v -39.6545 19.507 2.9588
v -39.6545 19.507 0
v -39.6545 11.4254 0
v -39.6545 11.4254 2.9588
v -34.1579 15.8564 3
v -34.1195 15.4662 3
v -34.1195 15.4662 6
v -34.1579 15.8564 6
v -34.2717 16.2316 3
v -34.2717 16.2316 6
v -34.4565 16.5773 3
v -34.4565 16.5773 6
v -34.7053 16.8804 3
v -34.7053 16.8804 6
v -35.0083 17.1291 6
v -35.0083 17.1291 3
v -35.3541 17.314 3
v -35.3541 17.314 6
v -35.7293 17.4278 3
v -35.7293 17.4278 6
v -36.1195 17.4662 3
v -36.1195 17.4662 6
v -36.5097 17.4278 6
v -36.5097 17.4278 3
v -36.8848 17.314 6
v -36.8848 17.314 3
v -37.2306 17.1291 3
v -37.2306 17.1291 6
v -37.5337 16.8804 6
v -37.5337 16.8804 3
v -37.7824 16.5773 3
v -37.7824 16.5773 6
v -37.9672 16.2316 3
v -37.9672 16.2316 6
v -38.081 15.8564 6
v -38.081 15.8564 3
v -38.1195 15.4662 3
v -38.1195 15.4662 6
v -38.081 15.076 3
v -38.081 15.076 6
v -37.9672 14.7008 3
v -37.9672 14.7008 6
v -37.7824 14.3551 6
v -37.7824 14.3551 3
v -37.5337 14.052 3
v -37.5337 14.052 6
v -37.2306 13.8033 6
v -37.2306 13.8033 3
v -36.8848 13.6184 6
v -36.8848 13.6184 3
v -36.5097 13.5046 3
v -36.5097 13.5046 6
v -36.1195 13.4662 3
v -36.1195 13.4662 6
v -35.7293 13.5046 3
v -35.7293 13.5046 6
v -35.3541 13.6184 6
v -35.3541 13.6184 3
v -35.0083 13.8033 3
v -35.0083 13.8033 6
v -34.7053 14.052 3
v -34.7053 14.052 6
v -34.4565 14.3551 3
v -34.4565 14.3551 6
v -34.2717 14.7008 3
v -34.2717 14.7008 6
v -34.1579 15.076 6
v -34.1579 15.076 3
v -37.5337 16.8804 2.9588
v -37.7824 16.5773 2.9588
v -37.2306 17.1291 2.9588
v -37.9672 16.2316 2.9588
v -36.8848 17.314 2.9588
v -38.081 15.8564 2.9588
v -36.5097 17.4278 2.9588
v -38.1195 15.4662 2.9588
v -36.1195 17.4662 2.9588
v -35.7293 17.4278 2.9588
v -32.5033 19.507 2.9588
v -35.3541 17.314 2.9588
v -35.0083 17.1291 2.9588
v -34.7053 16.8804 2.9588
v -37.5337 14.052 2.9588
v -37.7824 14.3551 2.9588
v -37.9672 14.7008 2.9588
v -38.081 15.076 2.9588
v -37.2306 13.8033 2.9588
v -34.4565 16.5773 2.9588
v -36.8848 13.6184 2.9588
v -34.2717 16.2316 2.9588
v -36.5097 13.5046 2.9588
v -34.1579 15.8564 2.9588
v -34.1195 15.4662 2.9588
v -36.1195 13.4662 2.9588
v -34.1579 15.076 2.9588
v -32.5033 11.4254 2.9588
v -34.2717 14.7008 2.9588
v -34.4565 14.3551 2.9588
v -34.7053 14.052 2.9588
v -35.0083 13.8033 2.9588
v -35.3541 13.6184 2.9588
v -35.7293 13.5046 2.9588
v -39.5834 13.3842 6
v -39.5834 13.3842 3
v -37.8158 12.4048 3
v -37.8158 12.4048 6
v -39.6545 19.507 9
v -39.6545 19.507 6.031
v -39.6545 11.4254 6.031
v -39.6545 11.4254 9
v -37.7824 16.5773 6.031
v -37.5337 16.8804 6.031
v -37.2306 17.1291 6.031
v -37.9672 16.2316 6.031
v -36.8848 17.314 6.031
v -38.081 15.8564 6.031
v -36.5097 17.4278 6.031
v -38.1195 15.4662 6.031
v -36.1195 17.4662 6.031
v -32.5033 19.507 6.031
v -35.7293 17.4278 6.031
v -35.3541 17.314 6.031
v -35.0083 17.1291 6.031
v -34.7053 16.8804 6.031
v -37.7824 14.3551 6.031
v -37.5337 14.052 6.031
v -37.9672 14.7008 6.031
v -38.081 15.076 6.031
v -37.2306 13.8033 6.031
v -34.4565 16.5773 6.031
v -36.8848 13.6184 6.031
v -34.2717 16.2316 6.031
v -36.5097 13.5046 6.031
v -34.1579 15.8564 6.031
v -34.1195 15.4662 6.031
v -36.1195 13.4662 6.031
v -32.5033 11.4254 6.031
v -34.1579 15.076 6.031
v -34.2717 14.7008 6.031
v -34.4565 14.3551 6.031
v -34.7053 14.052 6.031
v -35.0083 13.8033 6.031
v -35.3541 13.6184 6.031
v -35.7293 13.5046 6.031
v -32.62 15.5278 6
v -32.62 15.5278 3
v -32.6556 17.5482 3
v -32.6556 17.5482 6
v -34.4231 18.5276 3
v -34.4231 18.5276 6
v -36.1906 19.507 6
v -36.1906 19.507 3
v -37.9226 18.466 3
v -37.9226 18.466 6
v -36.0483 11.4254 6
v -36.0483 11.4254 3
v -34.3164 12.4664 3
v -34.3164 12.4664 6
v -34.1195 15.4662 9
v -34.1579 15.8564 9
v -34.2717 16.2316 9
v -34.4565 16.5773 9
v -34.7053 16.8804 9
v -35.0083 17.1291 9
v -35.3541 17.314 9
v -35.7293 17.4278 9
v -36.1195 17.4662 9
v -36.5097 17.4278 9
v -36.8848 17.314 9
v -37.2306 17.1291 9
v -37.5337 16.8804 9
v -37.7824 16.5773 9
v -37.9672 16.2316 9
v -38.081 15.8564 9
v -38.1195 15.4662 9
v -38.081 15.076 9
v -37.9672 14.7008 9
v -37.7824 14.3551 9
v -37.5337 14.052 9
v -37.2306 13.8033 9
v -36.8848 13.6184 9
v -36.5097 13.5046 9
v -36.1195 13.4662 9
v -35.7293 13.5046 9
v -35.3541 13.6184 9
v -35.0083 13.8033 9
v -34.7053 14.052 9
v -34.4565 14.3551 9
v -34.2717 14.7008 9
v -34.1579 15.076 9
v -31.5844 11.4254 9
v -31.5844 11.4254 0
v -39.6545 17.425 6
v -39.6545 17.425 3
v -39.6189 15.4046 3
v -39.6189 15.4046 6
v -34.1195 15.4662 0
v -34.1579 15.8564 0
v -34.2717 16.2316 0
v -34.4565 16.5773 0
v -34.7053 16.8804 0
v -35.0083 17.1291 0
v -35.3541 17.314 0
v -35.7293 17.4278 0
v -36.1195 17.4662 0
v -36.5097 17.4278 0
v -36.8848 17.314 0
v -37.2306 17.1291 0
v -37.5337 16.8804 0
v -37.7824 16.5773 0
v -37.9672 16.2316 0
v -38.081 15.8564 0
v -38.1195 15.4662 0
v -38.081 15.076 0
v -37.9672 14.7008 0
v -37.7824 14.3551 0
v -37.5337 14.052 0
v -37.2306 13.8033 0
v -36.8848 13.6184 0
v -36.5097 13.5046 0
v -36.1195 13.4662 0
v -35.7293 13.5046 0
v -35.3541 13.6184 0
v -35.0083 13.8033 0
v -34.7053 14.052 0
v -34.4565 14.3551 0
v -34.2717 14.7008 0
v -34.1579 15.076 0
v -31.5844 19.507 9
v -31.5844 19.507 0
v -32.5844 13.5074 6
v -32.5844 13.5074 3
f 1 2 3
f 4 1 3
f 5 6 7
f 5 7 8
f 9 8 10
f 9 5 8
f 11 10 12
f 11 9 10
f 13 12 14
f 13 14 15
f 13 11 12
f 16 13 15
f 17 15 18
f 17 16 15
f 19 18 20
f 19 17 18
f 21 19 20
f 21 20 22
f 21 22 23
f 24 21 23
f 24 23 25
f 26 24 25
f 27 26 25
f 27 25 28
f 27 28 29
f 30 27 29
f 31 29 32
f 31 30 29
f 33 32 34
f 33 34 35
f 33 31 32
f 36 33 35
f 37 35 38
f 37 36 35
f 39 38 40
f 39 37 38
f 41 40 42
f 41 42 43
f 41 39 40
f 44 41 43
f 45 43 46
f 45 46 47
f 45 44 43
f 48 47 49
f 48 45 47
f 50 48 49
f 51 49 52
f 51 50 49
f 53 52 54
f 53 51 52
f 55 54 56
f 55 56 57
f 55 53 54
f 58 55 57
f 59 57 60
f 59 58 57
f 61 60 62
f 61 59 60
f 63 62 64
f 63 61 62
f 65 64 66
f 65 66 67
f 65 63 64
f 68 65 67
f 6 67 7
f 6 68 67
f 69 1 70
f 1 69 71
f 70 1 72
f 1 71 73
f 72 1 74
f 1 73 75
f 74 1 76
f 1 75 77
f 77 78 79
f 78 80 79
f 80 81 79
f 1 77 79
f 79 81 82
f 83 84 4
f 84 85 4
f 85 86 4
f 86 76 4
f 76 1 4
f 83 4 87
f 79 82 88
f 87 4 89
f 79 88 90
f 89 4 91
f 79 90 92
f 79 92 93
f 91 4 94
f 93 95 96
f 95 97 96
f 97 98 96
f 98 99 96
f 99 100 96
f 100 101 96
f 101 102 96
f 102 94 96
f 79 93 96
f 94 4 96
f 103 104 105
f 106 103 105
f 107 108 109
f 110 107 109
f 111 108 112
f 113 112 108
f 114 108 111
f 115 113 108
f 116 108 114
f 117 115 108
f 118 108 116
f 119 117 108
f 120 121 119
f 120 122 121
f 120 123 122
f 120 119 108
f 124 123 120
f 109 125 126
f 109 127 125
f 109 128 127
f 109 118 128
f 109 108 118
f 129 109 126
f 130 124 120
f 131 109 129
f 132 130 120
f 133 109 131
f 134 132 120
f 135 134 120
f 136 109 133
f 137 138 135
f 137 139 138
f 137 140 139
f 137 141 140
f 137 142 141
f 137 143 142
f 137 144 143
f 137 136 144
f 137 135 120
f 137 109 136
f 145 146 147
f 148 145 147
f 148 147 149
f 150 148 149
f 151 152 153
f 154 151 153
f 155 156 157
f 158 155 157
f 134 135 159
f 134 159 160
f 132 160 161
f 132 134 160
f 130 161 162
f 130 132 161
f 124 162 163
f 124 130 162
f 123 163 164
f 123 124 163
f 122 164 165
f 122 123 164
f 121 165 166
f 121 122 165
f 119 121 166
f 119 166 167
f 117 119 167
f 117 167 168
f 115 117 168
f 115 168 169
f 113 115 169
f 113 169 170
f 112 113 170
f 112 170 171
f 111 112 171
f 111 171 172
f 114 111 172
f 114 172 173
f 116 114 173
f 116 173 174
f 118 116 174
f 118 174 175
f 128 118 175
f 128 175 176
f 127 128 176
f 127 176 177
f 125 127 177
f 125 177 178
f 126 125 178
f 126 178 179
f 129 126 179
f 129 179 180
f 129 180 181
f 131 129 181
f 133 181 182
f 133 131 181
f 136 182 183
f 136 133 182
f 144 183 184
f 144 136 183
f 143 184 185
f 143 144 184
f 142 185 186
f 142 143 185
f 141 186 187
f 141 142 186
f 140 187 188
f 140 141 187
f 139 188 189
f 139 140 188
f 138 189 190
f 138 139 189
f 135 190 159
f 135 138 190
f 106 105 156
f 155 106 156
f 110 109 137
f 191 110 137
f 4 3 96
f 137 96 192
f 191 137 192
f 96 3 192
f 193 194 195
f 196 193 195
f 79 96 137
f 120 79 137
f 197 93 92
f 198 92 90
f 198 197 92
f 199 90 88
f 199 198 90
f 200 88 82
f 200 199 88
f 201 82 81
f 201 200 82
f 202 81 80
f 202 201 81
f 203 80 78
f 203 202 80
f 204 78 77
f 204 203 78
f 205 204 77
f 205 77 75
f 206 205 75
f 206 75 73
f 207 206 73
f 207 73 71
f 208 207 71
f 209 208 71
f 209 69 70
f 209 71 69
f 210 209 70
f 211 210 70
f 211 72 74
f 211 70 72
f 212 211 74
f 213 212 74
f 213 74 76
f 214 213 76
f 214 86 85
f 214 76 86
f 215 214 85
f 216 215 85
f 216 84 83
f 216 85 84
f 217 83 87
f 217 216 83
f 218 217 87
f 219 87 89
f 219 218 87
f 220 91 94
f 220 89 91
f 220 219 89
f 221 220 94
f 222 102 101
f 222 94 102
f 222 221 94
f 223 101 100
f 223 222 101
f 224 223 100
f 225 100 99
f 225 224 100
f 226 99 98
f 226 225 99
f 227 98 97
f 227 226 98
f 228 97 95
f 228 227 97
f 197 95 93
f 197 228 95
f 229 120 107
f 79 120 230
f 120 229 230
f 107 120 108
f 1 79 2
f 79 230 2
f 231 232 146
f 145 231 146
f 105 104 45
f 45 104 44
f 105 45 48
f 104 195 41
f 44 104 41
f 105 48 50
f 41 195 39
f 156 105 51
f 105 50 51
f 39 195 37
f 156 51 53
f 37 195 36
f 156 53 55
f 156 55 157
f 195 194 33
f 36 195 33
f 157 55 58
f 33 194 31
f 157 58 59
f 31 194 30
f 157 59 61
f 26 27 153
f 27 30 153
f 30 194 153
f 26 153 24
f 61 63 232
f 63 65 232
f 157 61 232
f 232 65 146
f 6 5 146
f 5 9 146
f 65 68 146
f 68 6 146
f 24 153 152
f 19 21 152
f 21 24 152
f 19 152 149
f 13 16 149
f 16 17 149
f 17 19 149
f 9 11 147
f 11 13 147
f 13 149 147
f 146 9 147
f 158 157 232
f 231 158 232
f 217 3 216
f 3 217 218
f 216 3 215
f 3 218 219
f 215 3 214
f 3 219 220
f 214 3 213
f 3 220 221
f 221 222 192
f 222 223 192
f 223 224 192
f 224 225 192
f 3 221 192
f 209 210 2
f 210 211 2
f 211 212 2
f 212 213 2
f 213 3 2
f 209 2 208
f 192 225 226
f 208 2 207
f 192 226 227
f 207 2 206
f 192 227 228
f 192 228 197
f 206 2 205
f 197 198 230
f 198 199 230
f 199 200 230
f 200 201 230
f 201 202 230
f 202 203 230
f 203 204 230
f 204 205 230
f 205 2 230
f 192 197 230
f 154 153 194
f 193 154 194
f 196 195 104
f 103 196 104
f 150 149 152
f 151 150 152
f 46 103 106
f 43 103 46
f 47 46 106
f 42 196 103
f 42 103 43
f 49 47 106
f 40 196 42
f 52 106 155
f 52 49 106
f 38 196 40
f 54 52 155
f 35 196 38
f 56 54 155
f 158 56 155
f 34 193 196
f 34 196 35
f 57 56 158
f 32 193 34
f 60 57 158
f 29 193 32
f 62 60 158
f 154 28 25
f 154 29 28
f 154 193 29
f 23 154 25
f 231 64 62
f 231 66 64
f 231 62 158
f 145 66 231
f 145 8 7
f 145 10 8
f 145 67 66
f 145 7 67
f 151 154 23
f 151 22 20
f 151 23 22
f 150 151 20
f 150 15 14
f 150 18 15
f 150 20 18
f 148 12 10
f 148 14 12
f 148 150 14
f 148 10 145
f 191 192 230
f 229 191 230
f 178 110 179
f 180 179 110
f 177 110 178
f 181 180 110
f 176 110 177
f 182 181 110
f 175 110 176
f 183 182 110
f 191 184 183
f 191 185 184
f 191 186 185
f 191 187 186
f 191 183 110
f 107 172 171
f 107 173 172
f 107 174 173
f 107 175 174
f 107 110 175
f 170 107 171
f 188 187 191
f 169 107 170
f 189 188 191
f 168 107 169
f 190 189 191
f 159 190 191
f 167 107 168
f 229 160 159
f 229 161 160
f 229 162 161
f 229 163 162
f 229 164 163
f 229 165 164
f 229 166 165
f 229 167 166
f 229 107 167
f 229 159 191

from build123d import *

# Parameters (mm, degrees)
F1_START = 3
F0_R     = 2
F1_DEPTH = 3
F2_DEPTH = 9
F3_W     = 7.1511580269
F3_H     = 3.0721682124
F4_DEPTH = 25


with BuildPart() as f1:
    # F0 (on Top) → F1 (new body)
    with BuildSketch(Plane.XY.offset(F1_START)):
        with BuildLine():
            ThreePointArc((-39.6189296859, 15.4045963577), (-39.1808945494, 17.1625789331), (-37.9225537154, 18.4660189438))
            Line((-37.9225537154, 18.4660189438), (-39.6544984202, 17.4250089553))
            Line((-39.6544984202, 17.4250089553), (-39.6189296859, 15.4045963577))
        make_face()
        with BuildLine():
            Line((-39.5833609418, 13.3841831991), (-37.8158476605, 12.4047801734))
            ThreePointArc((-37.8158476605, 12.4047801734), (-39.1192878718, 13.6631210573), (-39.6189296859, 15.4045963577))
            Line((-39.6189296859, 15.4045963577), (-39.5833609418, 13.3841831991))
        make_face()
        with BuildLine():
            Line((-36.0483344454, 11.4253771844), (-34.3163899469, 12.4663870488))
            ThreePointArc((-34.3163899469, 12.4663870488), (-36.0578650476, 11.9667451837), (-37.8158476605, 12.4047801734))
            Line((-37.8158476605, 12.4047801734), (-36.0483344454, 11.4253771844))
        make_face()
        with BuildLine():
            ThreePointArc((-32.6200141688, 15.5278099302), (-32.6196074877, 15.4970076286), (-32.6194719238, 15.4662029406))
            ThreePointArc((-32.6194719238, 15.4662029406), (-33.0730981024, 13.7429483046), (-34.3163899469, 12.4663870488))
            Line((-34.3163899469, 12.4663870488), (-32.5844454274, 13.5073969259))
            Line((-32.5844454274, 13.5073969259), (-32.6200141688, 15.5278099302))
        make_face()
        with BuildLine():
            ThreePointArc((-34.4230959253, 18.5276255628), (-33.1196560035, 17.26928487), (-32.6200141688, 15.5278099302))
            Line((-32.6200141688, 15.5278099302), (-32.6555829058, 17.5482226822))
            Line((-32.6555829058, 17.5482226822), (-34.4230959253, 18.5276255628))
        make_face()
        with BuildLine():
            ThreePointArc((-37.9225537154, 18.4660189438), (-36.1810785423, 18.9656607021), (-34.4230959253, 18.5276255628))
            Line((-34.4230959253, 18.5276255628), (-36.1906094022, 19.5070286969))
            Line((-36.1906094022, 19.5070286969), (-37.9225537154, 18.4660189438))
        make_face()
        with BuildLine():
            ThreePointArc((-34.3163899469, 12.4663870488), (-33.0730981024, 13.7429483046), (-32.6194719238, 15.4662029406))
            ThreePointArc((-32.6194719238, 15.4662029406), (-32.6196074877, 15.4970076286), (-32.6200141688, 15.5278099302))
            ThreePointArc((-32.6200141688, 15.5278099302), (-33.1196560035, 17.26928487), (-34.4230959253, 18.5276255628))
            ThreePointArc((-34.4230959253, 18.5276255628), (-36.1810785423, 18.9656607021), (-37.9225537154, 18.4660189438))
            ThreePointArc((-37.9225537154, 18.4660189438), (-39.1808945494, 17.1625789331), (-39.6189296859, 15.4045963577))
            ThreePointArc((-39.6189296859, 15.4045963577), (-39.1192878718, 13.6631210573), (-37.8158476605, 12.4047801734))
            ThreePointArc((-37.8158476605, 12.4047801734), (-36.0578650476, 11.9667451837), (-34.3163899469, 12.4663870488))
        make_face()
        with Locations((-36.1194719238, 15.4662029406)):
            Circle(F0_R, mode=Mode.SUBTRACT)
    extrude(amount=F1_DEPTH)


with BuildPart() as f2:
    # F0 (on Top) → F2 (new body)
    with BuildSketch(Plane.XY):
        with BuildLine():
            ThreePointArc((-39.6189296859, 15.4045963577), (-39.1808945494, 17.1625789331), (-37.9225537154, 18.4660189438))
            Line((-37.9225537154, 18.4660189438), (-39.6544984202, 17.4250089553))
            Line((-39.6544984202, 17.4250089553), (-39.6189296859, 15.4045963577))
        make_face()
        Polygon((-36.0483344454, 11.4253771844), (-37.8158476605, 12.4047801734), (-39.5833609418, 13.3841831991), (-39.6189296859, 15.4045963577), (-39.6544984202, 17.4250089553), (-39.6544984202, 11.4253771844), align=None)
        Polygon((-32.5844454274, 13.5073969259), (-34.3163899469, 12.4663870488), (-36.0483344454, 11.4253771844), (-32.5844454274, 11.4253771844), align=None)
        with BuildLine():
            ThreePointArc((-34.3163899469, 12.4663870488), (-33.0730981024, 13.7429483046), (-32.6194719238, 15.4662029406))
            ThreePointArc((-32.6194719238, 15.4662029406), (-32.6196074877, 15.4970076286), (-32.6200141688, 15.5278099302))
            ThreePointArc((-32.6200141688, 15.5278099302), (-33.1196560035, 17.26928487), (-34.4230959253, 18.5276255628))
            ThreePointArc((-34.4230959253, 18.5276255628), (-36.1810785423, 18.9656607021), (-37.9225537154, 18.4660189438))
            ThreePointArc((-37.9225537154, 18.4660189438), (-39.1808945494, 17.1625789331), (-39.6189296859, 15.4045963577))
            ThreePointArc((-39.6189296859, 15.4045963577), (-39.1192878718, 13.6631210573), (-37.8158476605, 12.4047801734))
            ThreePointArc((-37.8158476605, 12.4047801734), (-36.0578650476, 11.9667451837), (-34.3163899469, 12.4663870488))
        make_face()
        with Locations((-36.1194719238, 15.4662029406)):
            Circle(F0_R, mode=Mode.SUBTRACT)
        with BuildLine():
            ThreePointArc((-32.6200141688, 15.5278099302), (-32.6196074877, 15.4970076286), (-32.6194719238, 15.4662029406))
            ThreePointArc((-32.6194719238, 15.4662029406), (-33.0730981024, 13.7429483046), (-34.3163899469, 12.4663870488))
            Line((-34.3163899469, 12.4663870488), (-32.5844454274, 13.5073969259))
            Line((-32.5844454274, 13.5073969259), (-32.6200141688, 15.5278099302))
        make_face()
        Polygon((-39.6544984202, 17.4250089553), (-37.9225537154, 18.4660189438), (-36.1906094022, 19.5070286969), (-39.6544984202, 19.5070286969), align=None)
        Polygon((-32.5844454274, 19.5070286969), (-32.5844454274, 13.5073969259), (-32.5844454274, 11.4253771844), (-31.5844454274, 11.4253771844), (-31.5844454274, 19.5070286969), align=None)
        with BuildLine():
            ThreePointArc((-37.9225537154, 18.4660189438), (-36.1810785423, 18.9656607021), (-34.4230959253, 18.5276255628))
            Line((-34.4230959253, 18.5276255628), (-36.1906094022, 19.5070286969))
            Line((-36.1906094022, 19.5070286969), (-37.9225537154, 18.4660189438))
        make_face()
        Polygon((-32.6555829058, 17.5482226822), (-32.6200141688, 15.5278099302), (-32.5844454274, 13.5073969259), (-32.5844454274, 19.5070286969), (-36.1906094022, 19.5070286969), (-34.4230959253, 18.5276255628), align=None)
        with BuildLine():
            Line((-36.0483344454, 11.4253771844), (-34.3163899469, 12.4663870488))
            ThreePointArc((-34.3163899469, 12.4663870488), (-36.0578650476, 11.9667451837), (-37.8158476605, 12.4047801734))
            Line((-37.8158476605, 12.4047801734), (-36.0483344454, 11.4253771844))
        make_face()
        with BuildLine():
            Line((-39.5833609418, 13.3841831991), (-37.8158476605, 12.4047801734))
            ThreePointArc((-37.8158476605, 12.4047801734), (-39.1192878718, 13.6631210573), (-39.6189296859, 15.4045963577))
            Line((-39.6189296859, 15.4045963577), (-39.5833609418, 13.3841831991))
        make_face()
        with BuildLine():
            ThreePointArc((-34.4230959253, 18.5276255628), (-33.1196560035, 17.26928487), (-32.6200141688, 15.5278099302))
            Line((-32.6200141688, 15.5278099302), (-32.6555829058, 17.5482226822))
            Line((-32.6555829058, 17.5482226822), (-34.4230959253, 18.5276255628))
        make_face()
    extrude(amount=F2_DEPTH)

    # F3 (on face) → F4 (cut)
    with BuildSketch(Plane.XZ.offset(-11.4253771844)):
        with Locations((-36.0789194067, 4.4949187431)):
            Rectangle(F3_W, F3_H)
    extrude(amount=-F4_DEPTH, mode=Mode.SUBTRACT)


solid = Compound([f1.part, f2.part])
